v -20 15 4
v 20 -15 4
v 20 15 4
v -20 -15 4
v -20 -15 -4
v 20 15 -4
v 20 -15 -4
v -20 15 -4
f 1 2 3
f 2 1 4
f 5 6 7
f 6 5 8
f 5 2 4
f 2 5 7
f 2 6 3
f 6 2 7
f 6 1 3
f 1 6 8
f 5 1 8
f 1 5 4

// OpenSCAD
// Rectangular Solid Box with Dimensions 40mm x 30mm x 8mm
// Centered at origin for easy placement

cube([40, 30, 8], center = true); // Create the main body of the box
